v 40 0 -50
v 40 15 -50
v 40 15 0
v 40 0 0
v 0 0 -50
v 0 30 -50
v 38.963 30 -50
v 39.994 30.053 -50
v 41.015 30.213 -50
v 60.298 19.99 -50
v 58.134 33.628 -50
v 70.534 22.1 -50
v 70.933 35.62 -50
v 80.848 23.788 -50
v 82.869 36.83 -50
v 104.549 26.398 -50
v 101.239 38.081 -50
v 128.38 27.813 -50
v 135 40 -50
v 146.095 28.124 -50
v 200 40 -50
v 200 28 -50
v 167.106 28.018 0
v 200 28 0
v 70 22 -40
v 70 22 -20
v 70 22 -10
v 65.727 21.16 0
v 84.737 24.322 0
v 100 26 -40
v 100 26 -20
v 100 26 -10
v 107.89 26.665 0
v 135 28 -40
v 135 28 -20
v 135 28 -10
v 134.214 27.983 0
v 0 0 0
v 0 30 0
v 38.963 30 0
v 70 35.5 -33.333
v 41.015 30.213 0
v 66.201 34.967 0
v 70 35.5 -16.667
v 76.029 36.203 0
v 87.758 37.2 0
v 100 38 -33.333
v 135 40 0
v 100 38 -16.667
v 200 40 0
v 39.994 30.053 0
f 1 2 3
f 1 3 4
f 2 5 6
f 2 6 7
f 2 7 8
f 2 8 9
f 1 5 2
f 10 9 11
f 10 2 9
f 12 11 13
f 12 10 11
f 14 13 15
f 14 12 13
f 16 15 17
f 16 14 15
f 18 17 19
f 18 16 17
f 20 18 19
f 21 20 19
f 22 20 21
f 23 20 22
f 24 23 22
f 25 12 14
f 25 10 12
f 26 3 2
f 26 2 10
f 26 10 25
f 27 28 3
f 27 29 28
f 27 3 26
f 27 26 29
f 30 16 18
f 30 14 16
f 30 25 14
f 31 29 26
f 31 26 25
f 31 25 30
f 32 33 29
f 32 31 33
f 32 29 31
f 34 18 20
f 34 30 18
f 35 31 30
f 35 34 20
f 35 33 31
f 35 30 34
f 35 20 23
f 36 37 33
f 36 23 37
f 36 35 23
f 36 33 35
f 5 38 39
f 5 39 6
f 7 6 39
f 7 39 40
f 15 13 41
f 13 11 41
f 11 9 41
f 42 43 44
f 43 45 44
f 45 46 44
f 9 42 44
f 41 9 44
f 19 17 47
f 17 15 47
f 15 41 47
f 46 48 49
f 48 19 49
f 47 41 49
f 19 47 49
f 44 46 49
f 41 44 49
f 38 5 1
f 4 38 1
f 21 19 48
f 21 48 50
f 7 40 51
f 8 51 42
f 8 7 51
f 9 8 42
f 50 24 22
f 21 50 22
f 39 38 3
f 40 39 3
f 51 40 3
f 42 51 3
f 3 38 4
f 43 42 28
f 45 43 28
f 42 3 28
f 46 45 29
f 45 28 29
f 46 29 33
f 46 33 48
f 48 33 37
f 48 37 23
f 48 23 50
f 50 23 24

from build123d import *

# Parameters (mm, degrees)
SKETCH1_W           = 200
SKETCH1_H           = 50
BOSS_EXTRUDE1_DEPTH = 40
CUT_EXTRUDE1_DEPTH  = 51
CUT_EXTRUDE2_DEPTH  = 51.0000001
FILLET3_R           = 10


with BuildPart() as part:
    # Sketch1 → Boss-Extrude1 (new body)
    with BuildSketch(Plane(origin=(0, 0, 0), x_dir=(1, 0, 0), z_dir=(0, 1, 0))):
        with Locations((100, 25)):
            Rectangle(SKETCH1_W, SKETCH1_H)
    extrude(amount=BOSS_EXTRUDE1_DEPTH)

    # Sketch9 → Cut-Extrude1 (cut, through all)
    with BuildSketch(Plane.XY):
        with BuildLine():
            Line((40, 15), (40, 0))
            Line((40, 0), (200, 0))
            Line((200, 0), (200, 28))
            add(Edge.make_bspline(
                [(40, 15), (49.956623556, 17.554557146), (69.695225932, 22.618863079), (101.569485276, 26.484663085), (134.972625039, 28.43029981), (168.335074049, 27.910219147), (190.0005497, 27.971648152), (200, 28)],
                knots=[0, 0, 0, 0, 0.19118813, 0.379022714, 0.596595093, 0.81381312, 1, 1, 1, 1], degree=3))
        make_face()
    extrude(amount=-CUT_EXTRUDE1_DEPTH, mode=Mode.SUBTRACT)

    # Sketch11 → Cut-Extrude2 (cut, through all)
    with BuildSketch(Plane.XY):
        with BuildLine():
            Line((0, 30), (40, 30))
            add(Edge.make_bspline(
                [(40, 30), (49.965685719, 32.090607049), (69.767662187, 36.244676598), (101.665880925, 37.991623988), (123.327031089, 39.644618931), (135, 40)],
                knots=[0, 0, 0, 0, 0.233428343, 0.46382584, 0.73213141, 0.73213141, 0.73213141, 0.73213141], degree=3))
            Line((135, 40), (0, 40))
            Line((0, 40), (0, 30))
        make_face()
    extrude(amount=-CUT_EXTRUDE2_DEPTH, mode=Mode.SUBTRACT)

    # Fillet3
    fillet3_edges = [part.edges().sort_by_distance(p)[0] for p in [
        (40, 30, -25),
    ]]
    fillet(fillet3_edges, radius=FILLET3_R)


solid = part.part
